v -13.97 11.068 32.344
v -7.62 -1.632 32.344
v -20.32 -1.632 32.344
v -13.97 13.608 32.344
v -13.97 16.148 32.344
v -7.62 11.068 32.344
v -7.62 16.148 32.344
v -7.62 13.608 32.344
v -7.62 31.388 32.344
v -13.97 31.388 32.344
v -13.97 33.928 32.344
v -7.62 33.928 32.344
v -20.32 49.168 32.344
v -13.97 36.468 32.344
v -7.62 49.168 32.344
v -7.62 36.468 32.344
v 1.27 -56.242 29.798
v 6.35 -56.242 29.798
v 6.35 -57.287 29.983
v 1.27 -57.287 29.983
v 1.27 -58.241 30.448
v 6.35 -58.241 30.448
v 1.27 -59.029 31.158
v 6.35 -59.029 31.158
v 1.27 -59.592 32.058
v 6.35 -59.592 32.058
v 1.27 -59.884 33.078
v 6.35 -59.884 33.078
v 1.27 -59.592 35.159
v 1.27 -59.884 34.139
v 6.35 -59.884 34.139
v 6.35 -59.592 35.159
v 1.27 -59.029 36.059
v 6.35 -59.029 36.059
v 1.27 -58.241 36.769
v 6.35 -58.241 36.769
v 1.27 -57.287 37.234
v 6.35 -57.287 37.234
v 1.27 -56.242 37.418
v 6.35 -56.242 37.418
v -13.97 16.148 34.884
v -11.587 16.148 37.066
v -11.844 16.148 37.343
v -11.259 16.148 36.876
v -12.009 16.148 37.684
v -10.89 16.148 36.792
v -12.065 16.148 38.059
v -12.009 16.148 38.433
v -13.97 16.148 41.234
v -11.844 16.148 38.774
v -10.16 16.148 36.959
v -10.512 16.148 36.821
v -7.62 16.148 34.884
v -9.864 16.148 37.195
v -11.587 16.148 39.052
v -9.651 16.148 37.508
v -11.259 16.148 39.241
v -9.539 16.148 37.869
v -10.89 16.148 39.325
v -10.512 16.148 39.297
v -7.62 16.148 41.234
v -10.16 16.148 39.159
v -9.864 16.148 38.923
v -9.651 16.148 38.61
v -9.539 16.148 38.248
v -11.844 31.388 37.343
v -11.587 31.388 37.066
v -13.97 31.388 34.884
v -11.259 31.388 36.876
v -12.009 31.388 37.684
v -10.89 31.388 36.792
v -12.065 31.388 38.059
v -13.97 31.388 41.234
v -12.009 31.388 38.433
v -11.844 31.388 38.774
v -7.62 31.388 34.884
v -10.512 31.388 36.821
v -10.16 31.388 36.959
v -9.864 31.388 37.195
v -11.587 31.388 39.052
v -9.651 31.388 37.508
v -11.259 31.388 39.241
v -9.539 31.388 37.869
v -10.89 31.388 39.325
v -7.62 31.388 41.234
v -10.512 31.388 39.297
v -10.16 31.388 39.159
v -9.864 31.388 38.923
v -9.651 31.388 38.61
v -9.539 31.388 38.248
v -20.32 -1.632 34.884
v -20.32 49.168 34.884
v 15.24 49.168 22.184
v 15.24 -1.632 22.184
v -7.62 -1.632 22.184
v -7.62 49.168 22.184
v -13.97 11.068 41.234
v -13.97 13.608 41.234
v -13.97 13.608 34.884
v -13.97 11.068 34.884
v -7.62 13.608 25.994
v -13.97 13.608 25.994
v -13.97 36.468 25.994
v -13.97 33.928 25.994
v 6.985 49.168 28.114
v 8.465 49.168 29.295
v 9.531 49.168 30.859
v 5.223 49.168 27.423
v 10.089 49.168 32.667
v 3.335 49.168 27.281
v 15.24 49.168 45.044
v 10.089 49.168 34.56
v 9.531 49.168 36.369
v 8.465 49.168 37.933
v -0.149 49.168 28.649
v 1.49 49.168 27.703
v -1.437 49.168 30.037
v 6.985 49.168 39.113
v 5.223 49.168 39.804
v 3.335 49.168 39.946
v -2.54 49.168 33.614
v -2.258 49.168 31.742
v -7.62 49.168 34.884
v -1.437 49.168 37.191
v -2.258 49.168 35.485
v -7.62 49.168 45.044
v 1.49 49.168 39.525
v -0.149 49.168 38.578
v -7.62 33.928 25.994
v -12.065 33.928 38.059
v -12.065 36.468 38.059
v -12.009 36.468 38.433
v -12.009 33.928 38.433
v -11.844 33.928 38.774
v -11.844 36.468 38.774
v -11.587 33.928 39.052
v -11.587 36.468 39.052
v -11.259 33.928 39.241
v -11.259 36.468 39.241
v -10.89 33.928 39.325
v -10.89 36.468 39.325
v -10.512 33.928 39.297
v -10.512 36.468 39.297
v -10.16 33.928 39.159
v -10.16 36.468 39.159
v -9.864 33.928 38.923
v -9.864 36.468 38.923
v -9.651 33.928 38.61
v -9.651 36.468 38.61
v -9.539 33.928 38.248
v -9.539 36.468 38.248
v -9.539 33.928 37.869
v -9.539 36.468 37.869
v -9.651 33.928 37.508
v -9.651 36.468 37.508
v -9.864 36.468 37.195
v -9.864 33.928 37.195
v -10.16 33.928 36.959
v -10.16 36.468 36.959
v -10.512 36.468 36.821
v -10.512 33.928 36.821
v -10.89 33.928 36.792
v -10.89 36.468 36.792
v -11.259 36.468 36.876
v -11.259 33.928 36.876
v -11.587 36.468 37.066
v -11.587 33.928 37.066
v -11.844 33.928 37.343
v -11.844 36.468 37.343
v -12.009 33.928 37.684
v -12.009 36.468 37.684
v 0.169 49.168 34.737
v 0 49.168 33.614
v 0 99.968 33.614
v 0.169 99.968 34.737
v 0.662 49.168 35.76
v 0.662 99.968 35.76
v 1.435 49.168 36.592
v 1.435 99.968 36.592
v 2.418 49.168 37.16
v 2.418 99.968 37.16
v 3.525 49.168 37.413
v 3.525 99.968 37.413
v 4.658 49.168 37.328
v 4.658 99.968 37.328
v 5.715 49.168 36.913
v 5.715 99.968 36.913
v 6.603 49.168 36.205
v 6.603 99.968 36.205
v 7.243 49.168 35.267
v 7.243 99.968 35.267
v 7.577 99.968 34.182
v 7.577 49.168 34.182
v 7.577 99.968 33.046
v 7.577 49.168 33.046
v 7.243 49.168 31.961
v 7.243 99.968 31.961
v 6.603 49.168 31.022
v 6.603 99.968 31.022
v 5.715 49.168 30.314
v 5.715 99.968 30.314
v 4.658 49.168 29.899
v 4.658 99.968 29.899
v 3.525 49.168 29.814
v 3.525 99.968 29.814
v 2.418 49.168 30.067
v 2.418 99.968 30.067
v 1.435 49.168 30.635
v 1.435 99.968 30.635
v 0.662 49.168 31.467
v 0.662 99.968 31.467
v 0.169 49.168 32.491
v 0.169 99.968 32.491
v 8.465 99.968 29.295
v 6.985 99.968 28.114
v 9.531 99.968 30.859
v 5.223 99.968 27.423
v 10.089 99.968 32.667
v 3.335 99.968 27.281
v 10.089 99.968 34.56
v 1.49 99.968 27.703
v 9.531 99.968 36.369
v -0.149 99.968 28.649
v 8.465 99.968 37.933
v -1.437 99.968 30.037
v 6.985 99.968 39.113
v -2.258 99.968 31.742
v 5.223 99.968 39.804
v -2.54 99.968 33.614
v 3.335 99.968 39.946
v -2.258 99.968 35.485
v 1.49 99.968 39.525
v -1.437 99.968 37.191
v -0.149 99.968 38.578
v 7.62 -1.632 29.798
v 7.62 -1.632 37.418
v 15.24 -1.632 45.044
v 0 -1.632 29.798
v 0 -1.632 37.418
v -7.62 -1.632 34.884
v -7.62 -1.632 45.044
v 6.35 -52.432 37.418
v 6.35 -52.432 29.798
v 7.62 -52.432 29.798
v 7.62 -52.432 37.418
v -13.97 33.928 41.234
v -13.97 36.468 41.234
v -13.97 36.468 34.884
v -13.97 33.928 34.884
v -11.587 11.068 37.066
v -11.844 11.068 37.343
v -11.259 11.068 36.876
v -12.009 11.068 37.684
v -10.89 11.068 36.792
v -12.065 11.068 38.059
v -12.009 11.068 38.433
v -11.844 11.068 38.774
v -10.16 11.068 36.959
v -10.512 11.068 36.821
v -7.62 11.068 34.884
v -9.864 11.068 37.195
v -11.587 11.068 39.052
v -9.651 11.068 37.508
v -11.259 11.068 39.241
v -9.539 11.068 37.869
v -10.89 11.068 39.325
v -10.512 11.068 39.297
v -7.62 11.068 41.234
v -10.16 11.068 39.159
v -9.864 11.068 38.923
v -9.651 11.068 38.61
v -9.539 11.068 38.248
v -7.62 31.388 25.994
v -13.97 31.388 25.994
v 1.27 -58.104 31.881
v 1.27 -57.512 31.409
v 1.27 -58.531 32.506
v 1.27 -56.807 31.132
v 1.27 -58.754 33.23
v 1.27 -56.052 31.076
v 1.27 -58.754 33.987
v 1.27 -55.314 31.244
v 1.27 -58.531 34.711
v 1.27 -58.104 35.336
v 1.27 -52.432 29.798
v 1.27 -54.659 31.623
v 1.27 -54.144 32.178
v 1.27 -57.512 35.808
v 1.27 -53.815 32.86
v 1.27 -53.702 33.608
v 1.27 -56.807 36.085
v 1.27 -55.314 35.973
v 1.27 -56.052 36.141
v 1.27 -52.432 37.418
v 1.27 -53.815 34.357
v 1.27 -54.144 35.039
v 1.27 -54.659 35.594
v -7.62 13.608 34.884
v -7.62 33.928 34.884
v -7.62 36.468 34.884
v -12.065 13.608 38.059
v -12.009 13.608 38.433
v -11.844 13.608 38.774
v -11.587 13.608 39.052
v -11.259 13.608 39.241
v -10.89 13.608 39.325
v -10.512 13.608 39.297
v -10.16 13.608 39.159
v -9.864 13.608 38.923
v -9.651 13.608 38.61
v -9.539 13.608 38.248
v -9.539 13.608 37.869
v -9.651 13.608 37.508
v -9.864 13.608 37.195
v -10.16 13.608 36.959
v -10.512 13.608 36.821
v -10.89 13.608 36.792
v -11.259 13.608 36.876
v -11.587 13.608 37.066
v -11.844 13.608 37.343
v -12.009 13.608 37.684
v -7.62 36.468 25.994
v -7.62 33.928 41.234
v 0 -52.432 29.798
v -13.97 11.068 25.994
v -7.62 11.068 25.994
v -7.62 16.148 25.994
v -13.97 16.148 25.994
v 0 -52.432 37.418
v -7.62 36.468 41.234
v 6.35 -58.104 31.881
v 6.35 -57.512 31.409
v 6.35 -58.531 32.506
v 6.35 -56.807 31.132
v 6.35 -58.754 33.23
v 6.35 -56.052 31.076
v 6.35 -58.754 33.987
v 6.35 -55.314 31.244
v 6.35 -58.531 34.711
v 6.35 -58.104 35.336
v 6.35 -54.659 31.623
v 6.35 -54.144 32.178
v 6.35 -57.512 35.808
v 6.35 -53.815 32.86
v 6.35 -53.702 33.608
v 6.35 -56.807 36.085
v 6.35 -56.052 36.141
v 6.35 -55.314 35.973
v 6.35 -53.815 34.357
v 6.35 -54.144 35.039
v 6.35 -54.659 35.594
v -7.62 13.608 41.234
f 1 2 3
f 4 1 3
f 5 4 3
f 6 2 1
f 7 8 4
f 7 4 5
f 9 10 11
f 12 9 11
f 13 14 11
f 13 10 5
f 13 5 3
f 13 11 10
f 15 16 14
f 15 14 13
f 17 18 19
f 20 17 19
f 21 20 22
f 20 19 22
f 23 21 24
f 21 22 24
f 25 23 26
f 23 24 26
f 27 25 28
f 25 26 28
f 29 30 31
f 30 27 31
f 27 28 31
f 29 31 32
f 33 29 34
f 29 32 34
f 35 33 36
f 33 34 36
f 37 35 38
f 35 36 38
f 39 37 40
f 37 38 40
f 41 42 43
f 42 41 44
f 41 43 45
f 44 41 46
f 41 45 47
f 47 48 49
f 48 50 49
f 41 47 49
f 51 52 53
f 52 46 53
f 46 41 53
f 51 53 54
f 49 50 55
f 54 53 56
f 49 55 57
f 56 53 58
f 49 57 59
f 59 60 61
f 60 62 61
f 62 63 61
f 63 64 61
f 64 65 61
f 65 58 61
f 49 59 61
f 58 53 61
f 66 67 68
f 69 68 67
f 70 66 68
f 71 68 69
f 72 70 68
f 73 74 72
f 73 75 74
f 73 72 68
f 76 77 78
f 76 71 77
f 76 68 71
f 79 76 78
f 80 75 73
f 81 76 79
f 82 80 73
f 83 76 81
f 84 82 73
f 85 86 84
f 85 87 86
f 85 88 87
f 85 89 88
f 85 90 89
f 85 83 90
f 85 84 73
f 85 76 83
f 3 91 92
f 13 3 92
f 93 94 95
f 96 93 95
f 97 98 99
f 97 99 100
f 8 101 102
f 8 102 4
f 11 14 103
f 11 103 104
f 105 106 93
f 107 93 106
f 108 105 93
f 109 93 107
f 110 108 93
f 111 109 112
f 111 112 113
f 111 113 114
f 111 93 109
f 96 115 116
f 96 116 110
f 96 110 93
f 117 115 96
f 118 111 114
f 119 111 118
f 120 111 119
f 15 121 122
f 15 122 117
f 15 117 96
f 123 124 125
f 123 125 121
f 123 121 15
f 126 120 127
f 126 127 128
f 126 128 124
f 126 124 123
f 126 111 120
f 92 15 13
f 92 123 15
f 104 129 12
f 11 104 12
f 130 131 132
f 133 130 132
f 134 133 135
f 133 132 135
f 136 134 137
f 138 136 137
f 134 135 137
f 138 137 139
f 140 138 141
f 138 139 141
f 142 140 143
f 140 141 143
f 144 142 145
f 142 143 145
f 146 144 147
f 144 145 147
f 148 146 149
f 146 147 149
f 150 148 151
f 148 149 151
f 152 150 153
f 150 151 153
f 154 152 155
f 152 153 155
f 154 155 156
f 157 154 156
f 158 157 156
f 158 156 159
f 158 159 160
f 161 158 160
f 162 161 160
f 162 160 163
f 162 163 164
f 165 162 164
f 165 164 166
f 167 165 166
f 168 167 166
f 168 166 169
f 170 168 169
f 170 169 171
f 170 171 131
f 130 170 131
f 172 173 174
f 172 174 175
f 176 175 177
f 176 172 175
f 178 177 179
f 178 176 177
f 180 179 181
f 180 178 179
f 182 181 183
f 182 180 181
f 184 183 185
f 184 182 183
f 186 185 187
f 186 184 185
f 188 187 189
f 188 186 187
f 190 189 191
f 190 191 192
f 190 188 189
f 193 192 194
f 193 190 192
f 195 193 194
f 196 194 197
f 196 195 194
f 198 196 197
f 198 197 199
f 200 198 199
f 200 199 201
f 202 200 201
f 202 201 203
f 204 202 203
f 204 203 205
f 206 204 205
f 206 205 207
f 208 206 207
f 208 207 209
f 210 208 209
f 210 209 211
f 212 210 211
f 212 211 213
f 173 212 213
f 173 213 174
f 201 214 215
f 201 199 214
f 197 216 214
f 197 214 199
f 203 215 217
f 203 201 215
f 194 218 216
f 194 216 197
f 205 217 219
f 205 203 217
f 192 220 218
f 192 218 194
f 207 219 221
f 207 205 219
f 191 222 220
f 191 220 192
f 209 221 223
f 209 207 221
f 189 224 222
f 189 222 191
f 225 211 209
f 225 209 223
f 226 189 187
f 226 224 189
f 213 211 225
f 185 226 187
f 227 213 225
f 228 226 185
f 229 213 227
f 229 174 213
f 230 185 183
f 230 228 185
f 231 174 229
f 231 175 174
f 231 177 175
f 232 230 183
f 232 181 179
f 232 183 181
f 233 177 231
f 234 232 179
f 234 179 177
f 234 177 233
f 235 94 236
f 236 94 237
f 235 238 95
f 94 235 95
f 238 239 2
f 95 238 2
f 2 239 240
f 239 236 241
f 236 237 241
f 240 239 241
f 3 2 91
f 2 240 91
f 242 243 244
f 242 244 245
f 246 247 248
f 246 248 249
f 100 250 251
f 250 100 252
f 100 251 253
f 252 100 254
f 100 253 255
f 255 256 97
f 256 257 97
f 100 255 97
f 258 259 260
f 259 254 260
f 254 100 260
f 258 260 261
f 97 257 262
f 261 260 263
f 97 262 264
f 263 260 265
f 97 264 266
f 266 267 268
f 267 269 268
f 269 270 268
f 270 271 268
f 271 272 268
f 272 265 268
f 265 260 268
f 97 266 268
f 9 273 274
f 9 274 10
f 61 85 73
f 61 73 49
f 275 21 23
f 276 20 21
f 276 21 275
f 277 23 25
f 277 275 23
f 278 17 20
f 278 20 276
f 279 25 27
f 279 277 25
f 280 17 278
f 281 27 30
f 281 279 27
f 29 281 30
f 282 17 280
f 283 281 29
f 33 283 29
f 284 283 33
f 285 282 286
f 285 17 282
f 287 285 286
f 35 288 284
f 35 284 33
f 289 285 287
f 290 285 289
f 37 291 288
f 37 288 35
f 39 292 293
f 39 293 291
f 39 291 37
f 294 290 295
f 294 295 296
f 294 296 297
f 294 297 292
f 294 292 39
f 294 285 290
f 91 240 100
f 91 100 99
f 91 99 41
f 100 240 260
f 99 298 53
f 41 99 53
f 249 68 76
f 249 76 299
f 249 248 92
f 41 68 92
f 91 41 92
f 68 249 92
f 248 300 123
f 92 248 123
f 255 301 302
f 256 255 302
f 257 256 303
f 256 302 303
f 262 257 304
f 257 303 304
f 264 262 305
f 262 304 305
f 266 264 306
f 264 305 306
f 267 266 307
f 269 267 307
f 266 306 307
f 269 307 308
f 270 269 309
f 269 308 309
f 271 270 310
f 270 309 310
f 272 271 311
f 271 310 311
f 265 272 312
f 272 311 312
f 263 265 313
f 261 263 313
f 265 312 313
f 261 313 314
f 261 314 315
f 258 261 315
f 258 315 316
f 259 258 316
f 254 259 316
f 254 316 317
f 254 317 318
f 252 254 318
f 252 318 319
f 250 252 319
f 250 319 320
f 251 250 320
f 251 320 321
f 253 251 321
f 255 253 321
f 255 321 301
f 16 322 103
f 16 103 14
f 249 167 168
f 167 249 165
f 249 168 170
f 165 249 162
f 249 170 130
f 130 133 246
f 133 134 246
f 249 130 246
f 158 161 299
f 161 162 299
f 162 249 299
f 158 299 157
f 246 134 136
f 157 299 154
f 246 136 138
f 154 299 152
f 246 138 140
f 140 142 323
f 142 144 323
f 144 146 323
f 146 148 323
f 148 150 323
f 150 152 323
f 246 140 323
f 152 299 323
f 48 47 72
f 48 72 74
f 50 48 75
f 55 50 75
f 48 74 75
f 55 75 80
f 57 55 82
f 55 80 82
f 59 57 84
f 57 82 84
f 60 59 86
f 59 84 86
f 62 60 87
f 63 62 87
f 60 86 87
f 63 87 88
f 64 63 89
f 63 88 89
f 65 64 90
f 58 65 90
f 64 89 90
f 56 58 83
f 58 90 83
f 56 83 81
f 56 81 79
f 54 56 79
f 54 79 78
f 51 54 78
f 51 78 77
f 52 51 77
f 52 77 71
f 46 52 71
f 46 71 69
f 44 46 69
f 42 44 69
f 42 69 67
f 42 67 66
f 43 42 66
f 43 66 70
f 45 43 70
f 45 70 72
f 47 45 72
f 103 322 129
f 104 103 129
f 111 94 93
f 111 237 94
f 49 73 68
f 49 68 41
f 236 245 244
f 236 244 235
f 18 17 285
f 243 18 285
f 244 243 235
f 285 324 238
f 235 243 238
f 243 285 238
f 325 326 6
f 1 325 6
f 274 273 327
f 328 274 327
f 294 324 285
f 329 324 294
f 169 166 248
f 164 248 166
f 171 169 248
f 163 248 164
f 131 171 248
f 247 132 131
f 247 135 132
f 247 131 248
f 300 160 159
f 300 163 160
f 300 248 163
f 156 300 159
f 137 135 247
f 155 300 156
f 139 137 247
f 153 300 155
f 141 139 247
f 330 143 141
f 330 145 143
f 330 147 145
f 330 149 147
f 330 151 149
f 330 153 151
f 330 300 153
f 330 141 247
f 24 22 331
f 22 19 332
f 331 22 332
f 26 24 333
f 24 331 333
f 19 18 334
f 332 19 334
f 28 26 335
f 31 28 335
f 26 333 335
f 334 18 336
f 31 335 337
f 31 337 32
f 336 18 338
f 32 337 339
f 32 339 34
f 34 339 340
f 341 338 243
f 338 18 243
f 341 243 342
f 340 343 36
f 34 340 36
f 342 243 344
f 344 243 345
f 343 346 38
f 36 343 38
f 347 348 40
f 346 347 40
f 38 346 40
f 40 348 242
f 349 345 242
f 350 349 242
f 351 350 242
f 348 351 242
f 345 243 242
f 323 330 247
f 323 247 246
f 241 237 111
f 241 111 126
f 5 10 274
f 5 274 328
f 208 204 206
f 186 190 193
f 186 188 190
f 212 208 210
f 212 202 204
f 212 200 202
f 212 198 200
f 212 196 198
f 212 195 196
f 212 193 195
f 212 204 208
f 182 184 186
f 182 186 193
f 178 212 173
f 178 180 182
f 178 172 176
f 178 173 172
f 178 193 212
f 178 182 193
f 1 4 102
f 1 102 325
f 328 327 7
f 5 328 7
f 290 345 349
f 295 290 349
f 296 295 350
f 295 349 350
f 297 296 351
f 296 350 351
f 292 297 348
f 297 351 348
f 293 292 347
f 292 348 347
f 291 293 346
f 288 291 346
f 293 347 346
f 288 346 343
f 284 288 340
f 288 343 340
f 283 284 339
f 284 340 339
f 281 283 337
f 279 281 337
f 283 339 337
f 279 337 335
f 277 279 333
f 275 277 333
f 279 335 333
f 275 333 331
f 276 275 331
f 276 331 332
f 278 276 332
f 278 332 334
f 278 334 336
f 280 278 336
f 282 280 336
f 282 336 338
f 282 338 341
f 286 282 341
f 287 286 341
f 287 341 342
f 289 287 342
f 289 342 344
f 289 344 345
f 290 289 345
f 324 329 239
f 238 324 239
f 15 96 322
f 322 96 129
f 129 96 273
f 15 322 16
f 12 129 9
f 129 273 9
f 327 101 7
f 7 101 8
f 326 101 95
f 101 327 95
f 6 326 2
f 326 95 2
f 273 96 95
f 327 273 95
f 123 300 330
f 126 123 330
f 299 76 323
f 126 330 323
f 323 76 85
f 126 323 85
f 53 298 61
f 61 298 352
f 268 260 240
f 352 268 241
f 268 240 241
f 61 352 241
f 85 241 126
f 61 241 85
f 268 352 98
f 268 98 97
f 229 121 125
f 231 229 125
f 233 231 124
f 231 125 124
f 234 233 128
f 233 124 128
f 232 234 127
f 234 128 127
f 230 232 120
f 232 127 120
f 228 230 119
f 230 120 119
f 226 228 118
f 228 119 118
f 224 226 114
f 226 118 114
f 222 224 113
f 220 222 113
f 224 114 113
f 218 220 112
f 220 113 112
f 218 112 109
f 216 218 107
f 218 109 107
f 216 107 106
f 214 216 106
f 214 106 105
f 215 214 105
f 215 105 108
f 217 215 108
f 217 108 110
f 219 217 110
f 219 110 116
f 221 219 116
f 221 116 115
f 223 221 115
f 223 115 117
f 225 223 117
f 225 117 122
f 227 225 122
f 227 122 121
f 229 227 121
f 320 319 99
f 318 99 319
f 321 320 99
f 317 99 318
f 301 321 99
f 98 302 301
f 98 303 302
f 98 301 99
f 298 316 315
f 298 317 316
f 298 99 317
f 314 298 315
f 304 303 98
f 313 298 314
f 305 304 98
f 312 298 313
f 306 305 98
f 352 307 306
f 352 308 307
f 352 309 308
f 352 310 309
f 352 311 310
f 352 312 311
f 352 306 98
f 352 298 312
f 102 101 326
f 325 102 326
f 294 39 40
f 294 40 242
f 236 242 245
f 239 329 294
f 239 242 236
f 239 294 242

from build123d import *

# Parameters (mm, degrees)
F0_W      = 50.8
F0_H      = 7.62
F1_DEPTH  = 7.62
F2_W      = 5.08
F2_H      = 7.62
F3_DEPTH  = 7.62
F4_R      = 2.54
F5_DEPTH  = 25.4
F6_W      = 22.86
F6_H      = 22.86
F6_W_2    = 7.62
F6_H_2    = 7.62
F7_DEPTH  = 50.8
F8_R      = 6.35
F8_R_2    = 3.81
F9_DEPTH  = 50.8
F10_W     = 50.8
F10_H     = 2.54
F11_DEPTH = 35.56
F12_W     = 2.54
F12_H     = 6.35
F12_W_2   = 15.24
F13_DEPTH = 6.35
F14_R     = 1.27
F15_DEPTH = 25.4
F16_W     = 2.54
F16_H     = 6.35
F16_W_2   = 15.24
F17_DEPTH = 6.35


with BuildPart() as f1:
    # F0 (on Right) → F1 (new body)
    with BuildSketch(Plane.YZ):
        with Locations((-27.0321643911, 33.6084578316)):
            Rectangle(F0_W, F0_H)
    extrude(amount=F1_DEPTH)

    # F2 (on face) → F3 (join)
    with BuildSketch(Plane.XZ.offset(52.4321643911)):
        with Locations((3.81, 33.6084578316)):
            Rectangle(F2_W, F2_H)
    extrude(amount=F3_DEPTH)

    # F4 (on face) → F5 (cut)
    with BuildSketch(Plane.YZ.offset(6.35)):
        with Locations((-56.2421643911, 33.6084578316)):
            Circle(F4_R)
        with BuildLine():
            ThreePointArc((-56.2421643911, 29.7984578316), (-59.9211503168, 33.6084578316), (-56.2421643911, 37.4184578316))
            Line((-56.2421643911, 37.4184578316), (-60.0521643911, 37.4184578316))
            Line((-60.0521643911, 37.4184578316), (-60.0521643911, 29.7984578316))
            Line((-60.0521643911, 29.7984578316), (-56.2421643911, 29.7984578316))
        make_face()
    extrude(amount=-F5_DEPTH, mode=Mode.SUBTRACT)

    # F6 (on face) → F7 (join)
    with BuildSketch(Plane(origin=(0, -1.6321643911, 0), x_dir=(-1, 0, 0), z_dir=(0, 1, 0))):
        with Locations((-3.81, 33.6136929691)):
            Rectangle(F6_W, F6_H)
        with Locations((-3.81, 33.6084578316)):
            Rectangle(F6_W_2, F6_H_2, mode=Mode.SUBTRACT)
        with Locations((-3.81, 33.6084578316)):
            Rectangle(F6_W_2, F6_H_2)
    extrude(amount=F7_DEPTH)

    # F8 (on face) → F9 (join)
    with BuildSketch(Plane(origin=(0, 49.1678356089, 0), x_dir=(-1, 0, 0), z_dir=(0, 1, 0))):
        with Locations((-3.81, 33.6136929691)):
            Circle(F8_R)
        with Locations((-3.81, 33.6136929691)):
            Circle(F8_R_2, mode=Mode.SUBTRACT)
    extrude(amount=F9_DEPTH)

    # F10 (on face) → F11 (join)
    with BuildSketch(Plane.YZ.offset(15.24)):
        with Locations((23.7678356089, 33.6136929691)):
            Rectangle(F10_W, F10_H)
    extrude(amount=-F11_DEPTH)

    # F12 (on face) → F13 (join)
    with BuildSketch(Plane(origin=(-7.62, 0, 0), x_dir=(0, -1, 0), z_dir=(-1, 0, 0))):
        with Locations((-35.1978356089, 38.0586929691)):
            Rectangle(F12_W, F12_H)
        with Locations((-23.7678356089, 38.0586929691)):
            Rectangle(F12_W_2, F12_H)
        with Locations((-12.3378356089, 38.0586929691)):
            Rectangle(F12_W, F12_H)
    extrude(amount=F13_DEPTH)

    # F14 (on face) → F15 (cut)
    with BuildSketch(Plane(origin=(0, 36.4678356089, 0), x_dir=(-1, 0, 0), z_dir=(0, 1, 0))):
        with Locations((10.795, 38.0586929691)):
            Circle(F14_R)
    extrude(amount=-F15_DEPTH, mode=Mode.SUBTRACT)

    # F16 (on face) → F17 (join)
    with BuildSketch(Plane(origin=(-7.62, 0, 0), x_dir=(0, -1, 0), z_dir=(-1, 0, 0))):
        with Locations((-35.1978356089, 29.1686929691)):
            Rectangle(F16_W, F16_H)
        with Locations((-23.7678356089, 29.1686929691)):
            Rectangle(F16_W_2, F16_H)
        with Locations((-12.3378356089, 29.1686929691)):
            Rectangle(F16_W, F16_H)
    extrude(amount=F17_DEPTH)


solid = f1.part
